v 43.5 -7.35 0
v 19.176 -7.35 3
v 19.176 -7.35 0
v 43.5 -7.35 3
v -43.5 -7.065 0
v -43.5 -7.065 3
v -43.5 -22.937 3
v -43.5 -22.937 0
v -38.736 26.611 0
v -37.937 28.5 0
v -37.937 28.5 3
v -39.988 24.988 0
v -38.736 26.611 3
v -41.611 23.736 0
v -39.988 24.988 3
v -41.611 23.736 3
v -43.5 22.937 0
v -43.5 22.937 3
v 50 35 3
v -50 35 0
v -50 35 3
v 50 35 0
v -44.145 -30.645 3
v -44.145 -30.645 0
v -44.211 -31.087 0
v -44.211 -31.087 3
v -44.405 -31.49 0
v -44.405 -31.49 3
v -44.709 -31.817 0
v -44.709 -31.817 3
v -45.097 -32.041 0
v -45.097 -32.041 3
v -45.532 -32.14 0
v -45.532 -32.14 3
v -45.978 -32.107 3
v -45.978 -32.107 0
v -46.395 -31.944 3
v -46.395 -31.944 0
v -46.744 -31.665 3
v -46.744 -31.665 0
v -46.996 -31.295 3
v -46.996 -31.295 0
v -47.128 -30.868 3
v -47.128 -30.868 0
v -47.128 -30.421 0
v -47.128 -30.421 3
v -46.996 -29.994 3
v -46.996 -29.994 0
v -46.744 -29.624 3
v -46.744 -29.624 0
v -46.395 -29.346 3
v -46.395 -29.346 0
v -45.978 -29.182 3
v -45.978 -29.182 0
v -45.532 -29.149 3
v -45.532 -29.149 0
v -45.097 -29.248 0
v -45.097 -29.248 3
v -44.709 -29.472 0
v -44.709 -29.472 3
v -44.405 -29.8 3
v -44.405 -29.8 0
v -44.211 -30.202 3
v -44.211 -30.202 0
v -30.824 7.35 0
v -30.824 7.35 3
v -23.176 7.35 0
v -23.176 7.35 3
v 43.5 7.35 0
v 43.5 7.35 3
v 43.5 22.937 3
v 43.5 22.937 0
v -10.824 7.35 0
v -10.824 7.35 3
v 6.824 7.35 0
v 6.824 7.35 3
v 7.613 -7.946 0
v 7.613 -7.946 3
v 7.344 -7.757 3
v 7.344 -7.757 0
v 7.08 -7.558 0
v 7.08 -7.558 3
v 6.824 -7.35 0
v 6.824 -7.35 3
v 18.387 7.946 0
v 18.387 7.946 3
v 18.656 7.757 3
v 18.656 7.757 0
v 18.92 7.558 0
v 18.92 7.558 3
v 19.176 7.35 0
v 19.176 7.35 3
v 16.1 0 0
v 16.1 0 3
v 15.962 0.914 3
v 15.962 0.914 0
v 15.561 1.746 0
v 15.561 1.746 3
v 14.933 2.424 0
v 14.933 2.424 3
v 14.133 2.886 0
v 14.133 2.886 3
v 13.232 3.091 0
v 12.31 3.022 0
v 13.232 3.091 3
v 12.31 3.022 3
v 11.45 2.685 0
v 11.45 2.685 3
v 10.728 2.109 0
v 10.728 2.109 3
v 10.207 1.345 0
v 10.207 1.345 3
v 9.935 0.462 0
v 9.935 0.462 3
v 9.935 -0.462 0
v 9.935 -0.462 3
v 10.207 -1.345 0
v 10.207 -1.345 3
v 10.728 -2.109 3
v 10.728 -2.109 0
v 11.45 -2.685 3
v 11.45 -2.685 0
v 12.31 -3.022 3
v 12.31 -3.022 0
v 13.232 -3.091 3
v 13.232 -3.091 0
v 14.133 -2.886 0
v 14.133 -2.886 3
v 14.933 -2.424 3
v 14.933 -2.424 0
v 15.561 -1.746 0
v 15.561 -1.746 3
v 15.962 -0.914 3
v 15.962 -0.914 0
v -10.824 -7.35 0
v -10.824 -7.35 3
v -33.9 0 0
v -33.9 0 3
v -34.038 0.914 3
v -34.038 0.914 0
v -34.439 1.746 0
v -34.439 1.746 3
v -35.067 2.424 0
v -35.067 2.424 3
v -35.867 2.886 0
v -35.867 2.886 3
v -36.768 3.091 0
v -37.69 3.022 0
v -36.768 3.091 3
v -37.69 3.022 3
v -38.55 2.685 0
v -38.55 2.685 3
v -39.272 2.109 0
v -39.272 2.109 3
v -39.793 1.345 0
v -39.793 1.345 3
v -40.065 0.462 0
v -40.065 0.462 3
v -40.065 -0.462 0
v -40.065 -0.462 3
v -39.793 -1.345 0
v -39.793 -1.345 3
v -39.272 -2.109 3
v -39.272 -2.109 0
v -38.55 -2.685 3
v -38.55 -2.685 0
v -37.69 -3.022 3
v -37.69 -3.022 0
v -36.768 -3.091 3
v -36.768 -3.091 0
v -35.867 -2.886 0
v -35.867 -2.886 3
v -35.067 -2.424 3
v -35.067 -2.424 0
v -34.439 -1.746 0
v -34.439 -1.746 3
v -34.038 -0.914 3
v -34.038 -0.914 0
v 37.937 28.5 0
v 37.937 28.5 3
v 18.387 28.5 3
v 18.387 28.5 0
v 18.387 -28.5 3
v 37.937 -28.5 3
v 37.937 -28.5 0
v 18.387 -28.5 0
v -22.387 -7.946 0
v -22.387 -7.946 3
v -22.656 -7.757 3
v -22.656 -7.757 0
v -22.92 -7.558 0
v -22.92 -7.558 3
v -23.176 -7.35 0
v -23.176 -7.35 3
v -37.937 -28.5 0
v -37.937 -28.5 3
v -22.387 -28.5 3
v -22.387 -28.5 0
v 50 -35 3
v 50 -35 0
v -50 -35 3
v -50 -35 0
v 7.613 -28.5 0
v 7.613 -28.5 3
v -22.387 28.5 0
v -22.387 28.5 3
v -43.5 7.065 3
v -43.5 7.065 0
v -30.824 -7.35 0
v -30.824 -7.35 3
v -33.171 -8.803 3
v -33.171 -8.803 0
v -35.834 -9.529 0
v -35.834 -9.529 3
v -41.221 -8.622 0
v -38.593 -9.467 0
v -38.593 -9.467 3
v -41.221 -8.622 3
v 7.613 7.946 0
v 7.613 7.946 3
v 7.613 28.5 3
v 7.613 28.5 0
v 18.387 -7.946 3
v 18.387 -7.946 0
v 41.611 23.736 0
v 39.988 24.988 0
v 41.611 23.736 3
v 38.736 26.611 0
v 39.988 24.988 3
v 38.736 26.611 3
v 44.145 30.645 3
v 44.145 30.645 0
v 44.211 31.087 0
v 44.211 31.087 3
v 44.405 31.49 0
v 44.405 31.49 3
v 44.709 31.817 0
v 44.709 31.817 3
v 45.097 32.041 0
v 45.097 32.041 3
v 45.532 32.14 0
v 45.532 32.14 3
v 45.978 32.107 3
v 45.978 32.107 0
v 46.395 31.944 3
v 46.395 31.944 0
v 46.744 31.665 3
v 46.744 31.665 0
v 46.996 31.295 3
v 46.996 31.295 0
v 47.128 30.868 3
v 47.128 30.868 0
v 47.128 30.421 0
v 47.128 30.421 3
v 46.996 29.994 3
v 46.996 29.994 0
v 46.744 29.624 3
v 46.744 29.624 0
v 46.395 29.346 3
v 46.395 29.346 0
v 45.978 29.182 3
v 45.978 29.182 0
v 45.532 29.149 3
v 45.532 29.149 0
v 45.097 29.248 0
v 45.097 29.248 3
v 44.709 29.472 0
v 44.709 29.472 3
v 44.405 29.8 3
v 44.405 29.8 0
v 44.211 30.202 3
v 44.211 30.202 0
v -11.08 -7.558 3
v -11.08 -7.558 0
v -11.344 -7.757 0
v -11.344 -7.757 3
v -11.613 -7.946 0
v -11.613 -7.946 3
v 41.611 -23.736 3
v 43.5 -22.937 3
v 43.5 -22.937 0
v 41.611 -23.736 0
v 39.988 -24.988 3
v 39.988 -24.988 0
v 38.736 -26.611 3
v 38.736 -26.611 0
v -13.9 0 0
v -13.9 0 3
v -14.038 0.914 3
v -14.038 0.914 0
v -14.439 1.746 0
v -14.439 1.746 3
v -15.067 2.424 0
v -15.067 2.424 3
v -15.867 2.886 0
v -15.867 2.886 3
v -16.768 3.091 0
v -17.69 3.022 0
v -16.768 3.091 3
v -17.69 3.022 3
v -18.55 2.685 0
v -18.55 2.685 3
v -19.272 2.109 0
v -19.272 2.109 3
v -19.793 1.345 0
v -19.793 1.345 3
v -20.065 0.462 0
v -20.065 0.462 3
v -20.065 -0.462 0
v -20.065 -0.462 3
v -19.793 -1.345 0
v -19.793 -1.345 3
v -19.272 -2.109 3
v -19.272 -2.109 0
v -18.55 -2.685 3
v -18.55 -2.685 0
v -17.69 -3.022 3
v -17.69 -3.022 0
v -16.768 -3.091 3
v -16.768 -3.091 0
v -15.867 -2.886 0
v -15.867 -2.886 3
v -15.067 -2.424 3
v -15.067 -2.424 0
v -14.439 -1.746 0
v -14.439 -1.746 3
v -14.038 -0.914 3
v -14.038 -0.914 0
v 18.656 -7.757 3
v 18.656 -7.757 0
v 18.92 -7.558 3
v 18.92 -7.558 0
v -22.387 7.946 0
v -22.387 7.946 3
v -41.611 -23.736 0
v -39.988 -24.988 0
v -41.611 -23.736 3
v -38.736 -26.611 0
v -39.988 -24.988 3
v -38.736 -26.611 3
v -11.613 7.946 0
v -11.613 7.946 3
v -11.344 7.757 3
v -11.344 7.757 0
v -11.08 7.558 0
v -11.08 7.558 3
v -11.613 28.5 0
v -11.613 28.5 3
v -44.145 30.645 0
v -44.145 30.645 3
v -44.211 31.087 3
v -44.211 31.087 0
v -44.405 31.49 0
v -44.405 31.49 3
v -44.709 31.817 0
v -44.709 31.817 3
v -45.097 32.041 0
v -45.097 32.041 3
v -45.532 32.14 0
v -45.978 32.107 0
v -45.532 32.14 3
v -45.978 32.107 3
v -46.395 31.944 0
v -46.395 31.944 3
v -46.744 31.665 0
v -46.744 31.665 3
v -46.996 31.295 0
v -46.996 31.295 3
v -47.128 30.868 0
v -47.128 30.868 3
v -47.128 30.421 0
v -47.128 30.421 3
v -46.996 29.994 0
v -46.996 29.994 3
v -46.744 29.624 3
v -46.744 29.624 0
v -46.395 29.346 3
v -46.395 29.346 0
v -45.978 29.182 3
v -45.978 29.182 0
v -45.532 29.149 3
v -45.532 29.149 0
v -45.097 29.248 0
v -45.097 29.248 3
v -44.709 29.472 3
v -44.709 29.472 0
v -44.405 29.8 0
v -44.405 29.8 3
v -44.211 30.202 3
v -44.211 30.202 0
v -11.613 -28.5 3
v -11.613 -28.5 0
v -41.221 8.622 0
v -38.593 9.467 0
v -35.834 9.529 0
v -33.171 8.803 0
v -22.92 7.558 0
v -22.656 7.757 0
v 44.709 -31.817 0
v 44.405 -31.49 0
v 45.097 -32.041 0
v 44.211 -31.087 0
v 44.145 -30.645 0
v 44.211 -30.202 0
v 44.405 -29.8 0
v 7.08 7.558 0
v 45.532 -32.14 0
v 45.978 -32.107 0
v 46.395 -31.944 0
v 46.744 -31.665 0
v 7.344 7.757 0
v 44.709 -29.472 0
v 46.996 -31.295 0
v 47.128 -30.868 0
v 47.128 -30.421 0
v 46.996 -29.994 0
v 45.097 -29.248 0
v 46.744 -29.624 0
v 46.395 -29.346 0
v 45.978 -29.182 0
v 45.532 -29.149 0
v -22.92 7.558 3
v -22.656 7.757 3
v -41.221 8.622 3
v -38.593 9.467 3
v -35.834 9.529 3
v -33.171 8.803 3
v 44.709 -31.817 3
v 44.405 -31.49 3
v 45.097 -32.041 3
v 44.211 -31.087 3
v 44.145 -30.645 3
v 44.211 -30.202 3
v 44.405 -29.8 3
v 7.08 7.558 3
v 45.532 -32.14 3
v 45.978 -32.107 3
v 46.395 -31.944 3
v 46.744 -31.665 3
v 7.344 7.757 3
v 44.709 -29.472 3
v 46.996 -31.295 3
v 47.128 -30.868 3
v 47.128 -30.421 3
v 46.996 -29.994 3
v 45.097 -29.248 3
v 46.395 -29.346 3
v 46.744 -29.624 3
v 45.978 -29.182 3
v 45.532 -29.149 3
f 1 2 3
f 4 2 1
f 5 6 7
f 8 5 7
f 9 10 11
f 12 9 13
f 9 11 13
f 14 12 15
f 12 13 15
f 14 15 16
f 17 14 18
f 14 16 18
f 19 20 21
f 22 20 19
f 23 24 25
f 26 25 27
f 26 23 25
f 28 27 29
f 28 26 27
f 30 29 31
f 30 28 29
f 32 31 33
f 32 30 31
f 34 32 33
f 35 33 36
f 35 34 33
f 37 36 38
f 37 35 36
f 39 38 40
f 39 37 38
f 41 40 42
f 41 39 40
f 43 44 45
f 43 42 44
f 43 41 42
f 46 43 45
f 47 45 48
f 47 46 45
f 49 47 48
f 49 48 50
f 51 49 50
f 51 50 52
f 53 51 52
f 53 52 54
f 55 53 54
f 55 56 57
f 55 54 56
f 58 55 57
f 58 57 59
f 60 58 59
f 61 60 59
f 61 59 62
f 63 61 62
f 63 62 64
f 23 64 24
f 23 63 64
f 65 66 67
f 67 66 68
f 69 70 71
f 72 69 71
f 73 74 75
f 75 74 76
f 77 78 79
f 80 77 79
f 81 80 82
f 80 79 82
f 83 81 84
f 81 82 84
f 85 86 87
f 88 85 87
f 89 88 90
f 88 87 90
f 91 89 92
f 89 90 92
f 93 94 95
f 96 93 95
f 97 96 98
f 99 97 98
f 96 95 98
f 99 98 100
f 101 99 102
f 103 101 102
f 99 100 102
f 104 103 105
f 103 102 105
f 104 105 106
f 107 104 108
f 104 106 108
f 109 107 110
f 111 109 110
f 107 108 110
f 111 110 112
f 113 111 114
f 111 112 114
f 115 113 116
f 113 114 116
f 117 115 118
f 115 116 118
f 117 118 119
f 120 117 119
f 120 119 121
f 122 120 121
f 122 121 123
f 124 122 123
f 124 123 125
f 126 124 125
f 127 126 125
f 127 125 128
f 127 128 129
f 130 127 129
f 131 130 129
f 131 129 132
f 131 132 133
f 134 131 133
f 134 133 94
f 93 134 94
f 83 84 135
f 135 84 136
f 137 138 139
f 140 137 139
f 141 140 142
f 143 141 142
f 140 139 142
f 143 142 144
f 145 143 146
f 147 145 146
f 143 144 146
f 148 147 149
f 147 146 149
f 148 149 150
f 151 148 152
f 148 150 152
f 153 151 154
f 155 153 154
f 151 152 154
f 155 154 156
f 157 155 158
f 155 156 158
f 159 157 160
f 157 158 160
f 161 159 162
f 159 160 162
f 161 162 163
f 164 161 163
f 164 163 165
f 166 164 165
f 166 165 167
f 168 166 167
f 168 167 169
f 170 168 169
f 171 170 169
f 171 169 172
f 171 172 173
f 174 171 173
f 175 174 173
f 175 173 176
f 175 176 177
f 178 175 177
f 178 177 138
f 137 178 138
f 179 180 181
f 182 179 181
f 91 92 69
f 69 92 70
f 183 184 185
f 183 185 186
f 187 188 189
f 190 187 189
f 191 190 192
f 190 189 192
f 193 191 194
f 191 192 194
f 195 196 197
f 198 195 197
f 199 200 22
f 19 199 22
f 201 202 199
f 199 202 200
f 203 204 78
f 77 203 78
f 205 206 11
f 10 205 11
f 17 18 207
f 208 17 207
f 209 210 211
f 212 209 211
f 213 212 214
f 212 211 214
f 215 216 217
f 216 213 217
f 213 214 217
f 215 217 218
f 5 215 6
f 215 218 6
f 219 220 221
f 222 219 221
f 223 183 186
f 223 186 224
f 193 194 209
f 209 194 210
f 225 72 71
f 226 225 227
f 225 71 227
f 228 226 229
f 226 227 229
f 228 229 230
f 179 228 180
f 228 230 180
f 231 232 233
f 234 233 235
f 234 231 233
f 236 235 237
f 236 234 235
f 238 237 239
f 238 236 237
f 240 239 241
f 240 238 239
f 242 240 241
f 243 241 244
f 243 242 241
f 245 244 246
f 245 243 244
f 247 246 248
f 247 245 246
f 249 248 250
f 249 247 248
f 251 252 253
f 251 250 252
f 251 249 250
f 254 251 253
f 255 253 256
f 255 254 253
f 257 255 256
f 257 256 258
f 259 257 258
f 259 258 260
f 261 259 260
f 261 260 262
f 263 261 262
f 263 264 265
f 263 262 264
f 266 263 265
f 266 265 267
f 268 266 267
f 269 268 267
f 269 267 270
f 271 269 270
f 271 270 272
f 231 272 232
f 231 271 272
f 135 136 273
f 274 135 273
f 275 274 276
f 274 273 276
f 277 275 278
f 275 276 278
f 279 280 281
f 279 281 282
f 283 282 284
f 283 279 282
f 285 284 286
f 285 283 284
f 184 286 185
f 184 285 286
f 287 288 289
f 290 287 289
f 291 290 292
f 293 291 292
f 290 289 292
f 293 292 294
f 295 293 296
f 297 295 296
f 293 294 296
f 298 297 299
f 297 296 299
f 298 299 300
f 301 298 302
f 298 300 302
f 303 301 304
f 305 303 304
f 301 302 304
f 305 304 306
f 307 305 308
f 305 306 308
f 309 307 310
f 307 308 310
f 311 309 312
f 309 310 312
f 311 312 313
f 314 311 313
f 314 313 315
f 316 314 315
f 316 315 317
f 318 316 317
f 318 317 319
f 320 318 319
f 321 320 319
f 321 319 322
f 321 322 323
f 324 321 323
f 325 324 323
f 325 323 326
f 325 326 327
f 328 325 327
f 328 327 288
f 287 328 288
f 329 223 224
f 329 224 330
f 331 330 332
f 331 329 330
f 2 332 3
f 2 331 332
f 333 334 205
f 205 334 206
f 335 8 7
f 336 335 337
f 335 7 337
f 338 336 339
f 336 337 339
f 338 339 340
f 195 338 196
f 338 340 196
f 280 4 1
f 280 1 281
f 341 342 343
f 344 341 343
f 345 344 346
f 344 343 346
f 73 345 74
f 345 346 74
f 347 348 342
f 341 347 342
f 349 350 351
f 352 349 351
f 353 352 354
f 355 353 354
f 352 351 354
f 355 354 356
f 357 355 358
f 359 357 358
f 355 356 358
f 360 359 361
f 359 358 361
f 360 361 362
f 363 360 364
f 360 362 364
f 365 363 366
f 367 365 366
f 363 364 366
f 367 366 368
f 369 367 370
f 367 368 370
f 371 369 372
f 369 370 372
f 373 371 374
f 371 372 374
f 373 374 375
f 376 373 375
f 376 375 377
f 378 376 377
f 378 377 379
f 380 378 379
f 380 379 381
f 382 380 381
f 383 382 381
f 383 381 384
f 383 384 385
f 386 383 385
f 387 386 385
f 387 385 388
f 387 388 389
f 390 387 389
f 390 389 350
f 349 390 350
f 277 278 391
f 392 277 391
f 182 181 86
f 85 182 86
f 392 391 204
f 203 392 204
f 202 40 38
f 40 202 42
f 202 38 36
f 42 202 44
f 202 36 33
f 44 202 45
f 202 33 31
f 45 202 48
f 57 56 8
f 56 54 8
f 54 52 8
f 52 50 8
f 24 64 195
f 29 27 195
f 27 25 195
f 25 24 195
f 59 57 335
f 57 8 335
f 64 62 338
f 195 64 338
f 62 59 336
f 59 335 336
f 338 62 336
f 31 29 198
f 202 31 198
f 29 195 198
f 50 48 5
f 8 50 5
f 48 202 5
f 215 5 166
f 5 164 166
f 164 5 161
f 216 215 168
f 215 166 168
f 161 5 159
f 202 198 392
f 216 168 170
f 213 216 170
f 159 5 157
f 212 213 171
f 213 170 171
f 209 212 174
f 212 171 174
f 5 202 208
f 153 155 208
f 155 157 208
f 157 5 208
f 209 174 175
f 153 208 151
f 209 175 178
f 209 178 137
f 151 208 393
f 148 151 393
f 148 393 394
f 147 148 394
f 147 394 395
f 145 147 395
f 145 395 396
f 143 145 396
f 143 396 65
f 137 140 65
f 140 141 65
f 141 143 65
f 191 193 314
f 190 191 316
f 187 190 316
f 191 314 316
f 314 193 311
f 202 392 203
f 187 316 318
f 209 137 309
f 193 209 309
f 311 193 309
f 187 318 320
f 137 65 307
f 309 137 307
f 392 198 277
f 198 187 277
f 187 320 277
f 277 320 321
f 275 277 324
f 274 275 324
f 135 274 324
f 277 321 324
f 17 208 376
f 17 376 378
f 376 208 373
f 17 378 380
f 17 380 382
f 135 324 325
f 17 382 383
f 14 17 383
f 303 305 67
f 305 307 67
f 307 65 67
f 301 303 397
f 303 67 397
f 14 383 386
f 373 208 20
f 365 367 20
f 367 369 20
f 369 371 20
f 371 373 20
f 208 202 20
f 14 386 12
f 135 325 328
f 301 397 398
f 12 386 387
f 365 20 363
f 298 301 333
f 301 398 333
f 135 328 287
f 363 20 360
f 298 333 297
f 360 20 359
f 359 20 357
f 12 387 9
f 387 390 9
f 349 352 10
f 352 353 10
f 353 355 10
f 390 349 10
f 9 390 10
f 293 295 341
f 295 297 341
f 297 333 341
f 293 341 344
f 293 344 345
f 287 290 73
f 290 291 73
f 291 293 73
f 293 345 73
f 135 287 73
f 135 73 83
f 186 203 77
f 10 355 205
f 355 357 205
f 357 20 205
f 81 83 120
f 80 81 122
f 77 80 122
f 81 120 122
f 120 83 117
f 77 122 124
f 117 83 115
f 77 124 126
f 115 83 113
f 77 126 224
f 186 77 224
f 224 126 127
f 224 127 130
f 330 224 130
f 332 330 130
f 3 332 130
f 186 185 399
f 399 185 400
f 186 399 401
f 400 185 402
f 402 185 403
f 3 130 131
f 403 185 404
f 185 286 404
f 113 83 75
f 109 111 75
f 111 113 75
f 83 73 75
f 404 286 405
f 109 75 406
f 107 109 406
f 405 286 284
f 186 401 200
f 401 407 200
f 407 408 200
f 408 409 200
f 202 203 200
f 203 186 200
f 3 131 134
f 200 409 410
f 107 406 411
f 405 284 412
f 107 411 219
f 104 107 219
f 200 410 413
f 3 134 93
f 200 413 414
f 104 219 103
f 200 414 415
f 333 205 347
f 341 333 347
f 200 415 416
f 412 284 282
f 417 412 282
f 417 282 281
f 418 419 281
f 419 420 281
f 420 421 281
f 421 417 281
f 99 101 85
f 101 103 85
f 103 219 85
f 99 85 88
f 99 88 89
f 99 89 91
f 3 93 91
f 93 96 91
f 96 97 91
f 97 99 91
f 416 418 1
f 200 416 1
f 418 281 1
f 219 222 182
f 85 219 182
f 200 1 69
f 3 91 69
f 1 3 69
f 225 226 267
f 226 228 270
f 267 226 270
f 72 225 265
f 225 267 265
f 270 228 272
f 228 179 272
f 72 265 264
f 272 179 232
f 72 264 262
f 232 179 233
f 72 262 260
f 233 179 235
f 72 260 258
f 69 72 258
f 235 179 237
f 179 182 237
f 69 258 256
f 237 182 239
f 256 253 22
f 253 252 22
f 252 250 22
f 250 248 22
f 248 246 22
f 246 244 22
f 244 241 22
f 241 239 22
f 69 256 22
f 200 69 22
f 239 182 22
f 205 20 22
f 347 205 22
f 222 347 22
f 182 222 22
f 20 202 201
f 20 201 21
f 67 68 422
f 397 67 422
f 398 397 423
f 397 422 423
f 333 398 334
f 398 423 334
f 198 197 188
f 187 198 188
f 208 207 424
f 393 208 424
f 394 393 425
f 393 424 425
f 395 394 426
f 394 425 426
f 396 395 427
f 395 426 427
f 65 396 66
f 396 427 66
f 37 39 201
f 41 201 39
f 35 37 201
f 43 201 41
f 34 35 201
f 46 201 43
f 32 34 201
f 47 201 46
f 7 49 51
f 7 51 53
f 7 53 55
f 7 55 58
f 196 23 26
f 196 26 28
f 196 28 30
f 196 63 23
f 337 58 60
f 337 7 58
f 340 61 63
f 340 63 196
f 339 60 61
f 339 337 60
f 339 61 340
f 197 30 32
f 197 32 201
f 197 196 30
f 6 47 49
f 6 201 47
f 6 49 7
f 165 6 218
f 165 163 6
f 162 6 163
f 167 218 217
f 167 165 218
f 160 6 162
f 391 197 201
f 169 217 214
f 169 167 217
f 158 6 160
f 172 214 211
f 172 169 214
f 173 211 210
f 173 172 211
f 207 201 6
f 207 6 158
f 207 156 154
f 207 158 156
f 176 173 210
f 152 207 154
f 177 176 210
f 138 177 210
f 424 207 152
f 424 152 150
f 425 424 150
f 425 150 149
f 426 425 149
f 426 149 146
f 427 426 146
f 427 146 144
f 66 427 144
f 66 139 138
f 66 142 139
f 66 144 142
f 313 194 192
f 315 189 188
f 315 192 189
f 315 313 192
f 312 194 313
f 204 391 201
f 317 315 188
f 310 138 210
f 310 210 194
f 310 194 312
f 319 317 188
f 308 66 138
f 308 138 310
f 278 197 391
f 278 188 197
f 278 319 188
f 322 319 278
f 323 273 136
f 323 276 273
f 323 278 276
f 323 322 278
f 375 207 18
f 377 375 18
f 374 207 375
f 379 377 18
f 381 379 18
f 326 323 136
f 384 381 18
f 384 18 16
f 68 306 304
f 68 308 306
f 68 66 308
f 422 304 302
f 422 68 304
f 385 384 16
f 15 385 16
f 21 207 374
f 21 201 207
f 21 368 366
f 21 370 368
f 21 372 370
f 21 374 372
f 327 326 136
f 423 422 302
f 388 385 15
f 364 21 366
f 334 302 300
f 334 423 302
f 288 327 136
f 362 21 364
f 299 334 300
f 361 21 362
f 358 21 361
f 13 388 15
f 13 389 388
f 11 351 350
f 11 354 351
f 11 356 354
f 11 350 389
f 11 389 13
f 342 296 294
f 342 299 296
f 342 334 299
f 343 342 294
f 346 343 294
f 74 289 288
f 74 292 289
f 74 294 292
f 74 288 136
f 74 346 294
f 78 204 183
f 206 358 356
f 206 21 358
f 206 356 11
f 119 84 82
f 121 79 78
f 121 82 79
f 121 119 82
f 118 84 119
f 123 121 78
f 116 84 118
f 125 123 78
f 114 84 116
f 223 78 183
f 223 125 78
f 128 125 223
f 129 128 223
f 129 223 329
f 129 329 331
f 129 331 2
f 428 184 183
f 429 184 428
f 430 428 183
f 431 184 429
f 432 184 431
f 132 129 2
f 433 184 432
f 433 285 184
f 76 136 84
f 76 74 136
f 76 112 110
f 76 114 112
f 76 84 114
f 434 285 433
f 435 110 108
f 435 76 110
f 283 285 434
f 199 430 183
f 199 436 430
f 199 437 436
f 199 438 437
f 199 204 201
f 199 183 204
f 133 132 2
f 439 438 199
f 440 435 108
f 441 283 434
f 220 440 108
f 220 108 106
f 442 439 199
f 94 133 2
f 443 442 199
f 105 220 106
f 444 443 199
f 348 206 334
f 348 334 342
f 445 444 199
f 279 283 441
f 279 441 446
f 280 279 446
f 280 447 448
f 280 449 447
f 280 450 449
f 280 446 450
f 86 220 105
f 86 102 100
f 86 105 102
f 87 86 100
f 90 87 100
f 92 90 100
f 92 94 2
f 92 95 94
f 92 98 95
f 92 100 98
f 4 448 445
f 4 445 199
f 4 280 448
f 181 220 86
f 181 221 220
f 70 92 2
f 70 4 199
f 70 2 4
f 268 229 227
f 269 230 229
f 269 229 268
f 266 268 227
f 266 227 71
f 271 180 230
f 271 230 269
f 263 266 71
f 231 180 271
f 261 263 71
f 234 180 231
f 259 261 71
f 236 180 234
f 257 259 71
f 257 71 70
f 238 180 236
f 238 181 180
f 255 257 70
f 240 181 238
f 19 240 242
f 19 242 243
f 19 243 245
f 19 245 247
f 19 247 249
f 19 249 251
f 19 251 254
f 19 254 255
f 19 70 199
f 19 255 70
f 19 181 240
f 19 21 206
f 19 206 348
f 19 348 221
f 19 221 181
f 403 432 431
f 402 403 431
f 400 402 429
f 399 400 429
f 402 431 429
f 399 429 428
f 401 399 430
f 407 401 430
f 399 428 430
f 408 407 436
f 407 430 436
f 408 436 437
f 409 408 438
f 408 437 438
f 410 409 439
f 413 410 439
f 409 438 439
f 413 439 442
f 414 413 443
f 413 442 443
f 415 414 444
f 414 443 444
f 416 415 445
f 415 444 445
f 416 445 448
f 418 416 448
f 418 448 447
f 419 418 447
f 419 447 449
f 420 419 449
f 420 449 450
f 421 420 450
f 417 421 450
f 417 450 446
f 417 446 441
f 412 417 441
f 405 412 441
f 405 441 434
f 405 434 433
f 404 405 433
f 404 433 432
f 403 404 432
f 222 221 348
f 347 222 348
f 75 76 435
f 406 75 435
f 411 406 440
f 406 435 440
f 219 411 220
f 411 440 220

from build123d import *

# Parameters (mm, degrees)
SKETCH1_W               = 100
SKETCH1_H               = 70
BOSS_EXTRUDE1_DEPTH     = 3
SKETCH2_R               = 3.1
CUT_EXTRUDE1_DEPTH      = 62.10646447
SKETCH3_R               = 1.5
CUT_EXTRUDE2_DEPTH      = 62.10646447
MIRROR2_COPY_1_SKETCH_R = 1.5
MIRROR2_COPY_1_DEPTH    = 62.10646447
CUT_EXTRUDE3_DEPTH      = 62.10646447


with BuildPart() as part:
    # Sketch1 → Boss-Extrude1 (new body)
    with BuildSketch(Plane.XY):
        Rectangle(SKETCH1_W, SKETCH1_H)
    extrude(amount=BOSS_EXTRUDE1_DEPTH)

    # Sketch2 → Cut-Extrude1 (cut, through all)
    with BuildSketch(Plane.XY.offset(3)):
        with Locations((-17, 0)):
            Circle(SKETCH2_R)
        with Locations((-37, 0)):
            Circle(SKETCH2_R)
        with Locations((13, 0)):
            Circle(SKETCH2_R)
    extrude(amount=-CUT_EXTRUDE1_DEPTH, mode=Mode.SUBTRACT)

    # Sketch3 → Cut-Extrude2 (cut, through all)
    with BuildSketch(Plane.XY.offset(3)):
        with Locations((-45.644550594, 30.644550594)):
            Circle(SKETCH3_R)
    cut_extrude2 = extrude(amount=-CUT_EXTRUDE2_DEPTH, mode=Mode.SUBTRACT)

    # Mirror1: Cut-Extrude2 across plane
    add(cut_extrude2.mirror(Plane(origin=(0, 0, 0), x_dir=(0, 0, 1), z_dir=(1, 0, 0))), mode=Mode.SUBTRACT)

    # Mirror2: Cut-Extrude2 across plane
    add(cut_extrude2.mirror(Plane.ZX), mode=Mode.SUBTRACT)

    # Mirror2 copy 1 sketch → Mirror2 copy 1 (cut, through all)
    with BuildSketch(Plane(origin=(0, 0, 3), x_dir=(-1, 0, 0), z_dir=(0, 0, 1))):
        with Locations((-45.644550594, 30.644550594)):
            Circle(MIRROR2_COPY_1_SKETCH_R)
    extrude(amount=-MIRROR2_COPY_1_DEPTH, mode=Mode.SUBTRACT)

    # Sketch4 → Cut-Extrude3 (cut, through all)
    with BuildSketch(Plane.XY.offset(3)):
        with BuildLine():
            Line((7.613447212, 28.5), (-11.613447212, 28.5))
            Line((-11.613447212, 28.5), (-11.613447212, 7.946385912))
            ThreePointArc((-11.613447212, 7.946385912), (-11.211126909, 7.658260137), (-10.824188204, 7.34978562))
            Line((-10.824188204, 7.34978562), (6.824188204, 7.34978562))
            ThreePointArc((6.824188204, 7.34978562), (7.211126909, 7.658260137), (7.613447212, 7.946385912))
            Line((7.613447212, 7.946385912), (7.613447212, 28.5))
        make_face()
        with BuildLine():
            Line((43.5, 7.34978562), (43.5, 22.937352481))
            ThreePointArc((43.5, 22.937352481), (39.987696344, 24.987696344), (37.937352481, 28.5))
            Line((37.937352481, 28.5), (18.386552788, 28.5))
            Line((18.386552788, 28.5), (18.386552788, 7.946385912))
            ThreePointArc((18.386552788, 7.946385912), (18.788873091, 7.658260137), (19.175811796, 7.34978562))
            Line((19.175811796, 7.34978562), (43.5, 7.34978562))
        make_face()
        with BuildLine():
            Line((19.175811796, -7.34978562), (43.5, -7.34978562))
            Line((43.5, -7.34978562), (43.5, -22.937352481))
            ThreePointArc((43.5, -22.937352481), (39.987696344, -24.987696344), (37.937352481, -28.5))
            Line((37.937352481, -28.5), (18.386552788, -28.5))
            Line((18.386552788, -28.5), (18.386552788, -7.946385912))
            ThreePointArc((18.386552788, -7.946385912), (18.788873091, -7.658260137), (19.175811796, -7.34978562))
        make_face()
        with BuildLine():
            Line((-22.386552788, 28.5), (-37.937352481, 28.5))
            ThreePointArc((-37.937352481, 28.5), (-39.987696344, 24.987696344), (-43.5, 22.937352481))
            Line((-43.5, 22.937352481), (-43.5, 7.064700984))
            ThreePointArc((-43.5, 7.064700984), (-37.215853678, 9.597572984), (-30.824188204, 7.34978562))
            Line((-30.824188204, 7.34978562), (-23.175811796, 7.34978562))
            ThreePointArc((-23.175811796, 7.34978562), (-22.788873091, 7.658260137), (-22.386552788, 7.946385912))
            Line((-22.386552788, 7.946385912), (-22.386552788, 28.5))
        make_face()
        with BuildLine():
            Line((-37.937352481, -28.5), (-22.386552788, -28.5))
            Line((-22.386552788, -28.5), (-22.386552788, -7.946385912))
            ThreePointArc((-22.386552788, -7.946385912), (-22.788873091, -7.658260137), (-23.175811796, -7.34978562))
            Line((-23.175811796, -7.34978562), (-30.824188204, -7.34978562))
            ThreePointArc((-30.824188204, -7.34978562), (-37.215853678, -9.597572984), (-43.5, -7.064700984))
            Line((-43.5, -7.064700984), (-43.5, -22.937352481))
            ThreePointArc((-43.5, -22.937352481), (-39.987696344, -24.987696344), (-37.937352481, -28.5))
        make_face()
        with BuildLine():
            Line((-11.613447212, -28.5), (7.613447212, -28.5))
            Line((7.613447212, -28.5), (7.613447212, -7.946385912))
            ThreePointArc((7.613447212, -7.946385912), (7.211126909, -7.658260137), (6.824188204, -7.34978562))
            Line((6.824188204, -7.34978562), (-10.824188204, -7.34978562))
            ThreePointArc((-10.824188204, -7.34978562), (-11.211126909, -7.658260137), (-11.613447212, -7.946385912))
            Line((-11.613447212, -7.946385912), (-11.613447212, -28.5))
        make_face()
    extrude(amount=-CUT_EXTRUDE3_DEPTH, mode=Mode.SUBTRACT)


solid = part.part
